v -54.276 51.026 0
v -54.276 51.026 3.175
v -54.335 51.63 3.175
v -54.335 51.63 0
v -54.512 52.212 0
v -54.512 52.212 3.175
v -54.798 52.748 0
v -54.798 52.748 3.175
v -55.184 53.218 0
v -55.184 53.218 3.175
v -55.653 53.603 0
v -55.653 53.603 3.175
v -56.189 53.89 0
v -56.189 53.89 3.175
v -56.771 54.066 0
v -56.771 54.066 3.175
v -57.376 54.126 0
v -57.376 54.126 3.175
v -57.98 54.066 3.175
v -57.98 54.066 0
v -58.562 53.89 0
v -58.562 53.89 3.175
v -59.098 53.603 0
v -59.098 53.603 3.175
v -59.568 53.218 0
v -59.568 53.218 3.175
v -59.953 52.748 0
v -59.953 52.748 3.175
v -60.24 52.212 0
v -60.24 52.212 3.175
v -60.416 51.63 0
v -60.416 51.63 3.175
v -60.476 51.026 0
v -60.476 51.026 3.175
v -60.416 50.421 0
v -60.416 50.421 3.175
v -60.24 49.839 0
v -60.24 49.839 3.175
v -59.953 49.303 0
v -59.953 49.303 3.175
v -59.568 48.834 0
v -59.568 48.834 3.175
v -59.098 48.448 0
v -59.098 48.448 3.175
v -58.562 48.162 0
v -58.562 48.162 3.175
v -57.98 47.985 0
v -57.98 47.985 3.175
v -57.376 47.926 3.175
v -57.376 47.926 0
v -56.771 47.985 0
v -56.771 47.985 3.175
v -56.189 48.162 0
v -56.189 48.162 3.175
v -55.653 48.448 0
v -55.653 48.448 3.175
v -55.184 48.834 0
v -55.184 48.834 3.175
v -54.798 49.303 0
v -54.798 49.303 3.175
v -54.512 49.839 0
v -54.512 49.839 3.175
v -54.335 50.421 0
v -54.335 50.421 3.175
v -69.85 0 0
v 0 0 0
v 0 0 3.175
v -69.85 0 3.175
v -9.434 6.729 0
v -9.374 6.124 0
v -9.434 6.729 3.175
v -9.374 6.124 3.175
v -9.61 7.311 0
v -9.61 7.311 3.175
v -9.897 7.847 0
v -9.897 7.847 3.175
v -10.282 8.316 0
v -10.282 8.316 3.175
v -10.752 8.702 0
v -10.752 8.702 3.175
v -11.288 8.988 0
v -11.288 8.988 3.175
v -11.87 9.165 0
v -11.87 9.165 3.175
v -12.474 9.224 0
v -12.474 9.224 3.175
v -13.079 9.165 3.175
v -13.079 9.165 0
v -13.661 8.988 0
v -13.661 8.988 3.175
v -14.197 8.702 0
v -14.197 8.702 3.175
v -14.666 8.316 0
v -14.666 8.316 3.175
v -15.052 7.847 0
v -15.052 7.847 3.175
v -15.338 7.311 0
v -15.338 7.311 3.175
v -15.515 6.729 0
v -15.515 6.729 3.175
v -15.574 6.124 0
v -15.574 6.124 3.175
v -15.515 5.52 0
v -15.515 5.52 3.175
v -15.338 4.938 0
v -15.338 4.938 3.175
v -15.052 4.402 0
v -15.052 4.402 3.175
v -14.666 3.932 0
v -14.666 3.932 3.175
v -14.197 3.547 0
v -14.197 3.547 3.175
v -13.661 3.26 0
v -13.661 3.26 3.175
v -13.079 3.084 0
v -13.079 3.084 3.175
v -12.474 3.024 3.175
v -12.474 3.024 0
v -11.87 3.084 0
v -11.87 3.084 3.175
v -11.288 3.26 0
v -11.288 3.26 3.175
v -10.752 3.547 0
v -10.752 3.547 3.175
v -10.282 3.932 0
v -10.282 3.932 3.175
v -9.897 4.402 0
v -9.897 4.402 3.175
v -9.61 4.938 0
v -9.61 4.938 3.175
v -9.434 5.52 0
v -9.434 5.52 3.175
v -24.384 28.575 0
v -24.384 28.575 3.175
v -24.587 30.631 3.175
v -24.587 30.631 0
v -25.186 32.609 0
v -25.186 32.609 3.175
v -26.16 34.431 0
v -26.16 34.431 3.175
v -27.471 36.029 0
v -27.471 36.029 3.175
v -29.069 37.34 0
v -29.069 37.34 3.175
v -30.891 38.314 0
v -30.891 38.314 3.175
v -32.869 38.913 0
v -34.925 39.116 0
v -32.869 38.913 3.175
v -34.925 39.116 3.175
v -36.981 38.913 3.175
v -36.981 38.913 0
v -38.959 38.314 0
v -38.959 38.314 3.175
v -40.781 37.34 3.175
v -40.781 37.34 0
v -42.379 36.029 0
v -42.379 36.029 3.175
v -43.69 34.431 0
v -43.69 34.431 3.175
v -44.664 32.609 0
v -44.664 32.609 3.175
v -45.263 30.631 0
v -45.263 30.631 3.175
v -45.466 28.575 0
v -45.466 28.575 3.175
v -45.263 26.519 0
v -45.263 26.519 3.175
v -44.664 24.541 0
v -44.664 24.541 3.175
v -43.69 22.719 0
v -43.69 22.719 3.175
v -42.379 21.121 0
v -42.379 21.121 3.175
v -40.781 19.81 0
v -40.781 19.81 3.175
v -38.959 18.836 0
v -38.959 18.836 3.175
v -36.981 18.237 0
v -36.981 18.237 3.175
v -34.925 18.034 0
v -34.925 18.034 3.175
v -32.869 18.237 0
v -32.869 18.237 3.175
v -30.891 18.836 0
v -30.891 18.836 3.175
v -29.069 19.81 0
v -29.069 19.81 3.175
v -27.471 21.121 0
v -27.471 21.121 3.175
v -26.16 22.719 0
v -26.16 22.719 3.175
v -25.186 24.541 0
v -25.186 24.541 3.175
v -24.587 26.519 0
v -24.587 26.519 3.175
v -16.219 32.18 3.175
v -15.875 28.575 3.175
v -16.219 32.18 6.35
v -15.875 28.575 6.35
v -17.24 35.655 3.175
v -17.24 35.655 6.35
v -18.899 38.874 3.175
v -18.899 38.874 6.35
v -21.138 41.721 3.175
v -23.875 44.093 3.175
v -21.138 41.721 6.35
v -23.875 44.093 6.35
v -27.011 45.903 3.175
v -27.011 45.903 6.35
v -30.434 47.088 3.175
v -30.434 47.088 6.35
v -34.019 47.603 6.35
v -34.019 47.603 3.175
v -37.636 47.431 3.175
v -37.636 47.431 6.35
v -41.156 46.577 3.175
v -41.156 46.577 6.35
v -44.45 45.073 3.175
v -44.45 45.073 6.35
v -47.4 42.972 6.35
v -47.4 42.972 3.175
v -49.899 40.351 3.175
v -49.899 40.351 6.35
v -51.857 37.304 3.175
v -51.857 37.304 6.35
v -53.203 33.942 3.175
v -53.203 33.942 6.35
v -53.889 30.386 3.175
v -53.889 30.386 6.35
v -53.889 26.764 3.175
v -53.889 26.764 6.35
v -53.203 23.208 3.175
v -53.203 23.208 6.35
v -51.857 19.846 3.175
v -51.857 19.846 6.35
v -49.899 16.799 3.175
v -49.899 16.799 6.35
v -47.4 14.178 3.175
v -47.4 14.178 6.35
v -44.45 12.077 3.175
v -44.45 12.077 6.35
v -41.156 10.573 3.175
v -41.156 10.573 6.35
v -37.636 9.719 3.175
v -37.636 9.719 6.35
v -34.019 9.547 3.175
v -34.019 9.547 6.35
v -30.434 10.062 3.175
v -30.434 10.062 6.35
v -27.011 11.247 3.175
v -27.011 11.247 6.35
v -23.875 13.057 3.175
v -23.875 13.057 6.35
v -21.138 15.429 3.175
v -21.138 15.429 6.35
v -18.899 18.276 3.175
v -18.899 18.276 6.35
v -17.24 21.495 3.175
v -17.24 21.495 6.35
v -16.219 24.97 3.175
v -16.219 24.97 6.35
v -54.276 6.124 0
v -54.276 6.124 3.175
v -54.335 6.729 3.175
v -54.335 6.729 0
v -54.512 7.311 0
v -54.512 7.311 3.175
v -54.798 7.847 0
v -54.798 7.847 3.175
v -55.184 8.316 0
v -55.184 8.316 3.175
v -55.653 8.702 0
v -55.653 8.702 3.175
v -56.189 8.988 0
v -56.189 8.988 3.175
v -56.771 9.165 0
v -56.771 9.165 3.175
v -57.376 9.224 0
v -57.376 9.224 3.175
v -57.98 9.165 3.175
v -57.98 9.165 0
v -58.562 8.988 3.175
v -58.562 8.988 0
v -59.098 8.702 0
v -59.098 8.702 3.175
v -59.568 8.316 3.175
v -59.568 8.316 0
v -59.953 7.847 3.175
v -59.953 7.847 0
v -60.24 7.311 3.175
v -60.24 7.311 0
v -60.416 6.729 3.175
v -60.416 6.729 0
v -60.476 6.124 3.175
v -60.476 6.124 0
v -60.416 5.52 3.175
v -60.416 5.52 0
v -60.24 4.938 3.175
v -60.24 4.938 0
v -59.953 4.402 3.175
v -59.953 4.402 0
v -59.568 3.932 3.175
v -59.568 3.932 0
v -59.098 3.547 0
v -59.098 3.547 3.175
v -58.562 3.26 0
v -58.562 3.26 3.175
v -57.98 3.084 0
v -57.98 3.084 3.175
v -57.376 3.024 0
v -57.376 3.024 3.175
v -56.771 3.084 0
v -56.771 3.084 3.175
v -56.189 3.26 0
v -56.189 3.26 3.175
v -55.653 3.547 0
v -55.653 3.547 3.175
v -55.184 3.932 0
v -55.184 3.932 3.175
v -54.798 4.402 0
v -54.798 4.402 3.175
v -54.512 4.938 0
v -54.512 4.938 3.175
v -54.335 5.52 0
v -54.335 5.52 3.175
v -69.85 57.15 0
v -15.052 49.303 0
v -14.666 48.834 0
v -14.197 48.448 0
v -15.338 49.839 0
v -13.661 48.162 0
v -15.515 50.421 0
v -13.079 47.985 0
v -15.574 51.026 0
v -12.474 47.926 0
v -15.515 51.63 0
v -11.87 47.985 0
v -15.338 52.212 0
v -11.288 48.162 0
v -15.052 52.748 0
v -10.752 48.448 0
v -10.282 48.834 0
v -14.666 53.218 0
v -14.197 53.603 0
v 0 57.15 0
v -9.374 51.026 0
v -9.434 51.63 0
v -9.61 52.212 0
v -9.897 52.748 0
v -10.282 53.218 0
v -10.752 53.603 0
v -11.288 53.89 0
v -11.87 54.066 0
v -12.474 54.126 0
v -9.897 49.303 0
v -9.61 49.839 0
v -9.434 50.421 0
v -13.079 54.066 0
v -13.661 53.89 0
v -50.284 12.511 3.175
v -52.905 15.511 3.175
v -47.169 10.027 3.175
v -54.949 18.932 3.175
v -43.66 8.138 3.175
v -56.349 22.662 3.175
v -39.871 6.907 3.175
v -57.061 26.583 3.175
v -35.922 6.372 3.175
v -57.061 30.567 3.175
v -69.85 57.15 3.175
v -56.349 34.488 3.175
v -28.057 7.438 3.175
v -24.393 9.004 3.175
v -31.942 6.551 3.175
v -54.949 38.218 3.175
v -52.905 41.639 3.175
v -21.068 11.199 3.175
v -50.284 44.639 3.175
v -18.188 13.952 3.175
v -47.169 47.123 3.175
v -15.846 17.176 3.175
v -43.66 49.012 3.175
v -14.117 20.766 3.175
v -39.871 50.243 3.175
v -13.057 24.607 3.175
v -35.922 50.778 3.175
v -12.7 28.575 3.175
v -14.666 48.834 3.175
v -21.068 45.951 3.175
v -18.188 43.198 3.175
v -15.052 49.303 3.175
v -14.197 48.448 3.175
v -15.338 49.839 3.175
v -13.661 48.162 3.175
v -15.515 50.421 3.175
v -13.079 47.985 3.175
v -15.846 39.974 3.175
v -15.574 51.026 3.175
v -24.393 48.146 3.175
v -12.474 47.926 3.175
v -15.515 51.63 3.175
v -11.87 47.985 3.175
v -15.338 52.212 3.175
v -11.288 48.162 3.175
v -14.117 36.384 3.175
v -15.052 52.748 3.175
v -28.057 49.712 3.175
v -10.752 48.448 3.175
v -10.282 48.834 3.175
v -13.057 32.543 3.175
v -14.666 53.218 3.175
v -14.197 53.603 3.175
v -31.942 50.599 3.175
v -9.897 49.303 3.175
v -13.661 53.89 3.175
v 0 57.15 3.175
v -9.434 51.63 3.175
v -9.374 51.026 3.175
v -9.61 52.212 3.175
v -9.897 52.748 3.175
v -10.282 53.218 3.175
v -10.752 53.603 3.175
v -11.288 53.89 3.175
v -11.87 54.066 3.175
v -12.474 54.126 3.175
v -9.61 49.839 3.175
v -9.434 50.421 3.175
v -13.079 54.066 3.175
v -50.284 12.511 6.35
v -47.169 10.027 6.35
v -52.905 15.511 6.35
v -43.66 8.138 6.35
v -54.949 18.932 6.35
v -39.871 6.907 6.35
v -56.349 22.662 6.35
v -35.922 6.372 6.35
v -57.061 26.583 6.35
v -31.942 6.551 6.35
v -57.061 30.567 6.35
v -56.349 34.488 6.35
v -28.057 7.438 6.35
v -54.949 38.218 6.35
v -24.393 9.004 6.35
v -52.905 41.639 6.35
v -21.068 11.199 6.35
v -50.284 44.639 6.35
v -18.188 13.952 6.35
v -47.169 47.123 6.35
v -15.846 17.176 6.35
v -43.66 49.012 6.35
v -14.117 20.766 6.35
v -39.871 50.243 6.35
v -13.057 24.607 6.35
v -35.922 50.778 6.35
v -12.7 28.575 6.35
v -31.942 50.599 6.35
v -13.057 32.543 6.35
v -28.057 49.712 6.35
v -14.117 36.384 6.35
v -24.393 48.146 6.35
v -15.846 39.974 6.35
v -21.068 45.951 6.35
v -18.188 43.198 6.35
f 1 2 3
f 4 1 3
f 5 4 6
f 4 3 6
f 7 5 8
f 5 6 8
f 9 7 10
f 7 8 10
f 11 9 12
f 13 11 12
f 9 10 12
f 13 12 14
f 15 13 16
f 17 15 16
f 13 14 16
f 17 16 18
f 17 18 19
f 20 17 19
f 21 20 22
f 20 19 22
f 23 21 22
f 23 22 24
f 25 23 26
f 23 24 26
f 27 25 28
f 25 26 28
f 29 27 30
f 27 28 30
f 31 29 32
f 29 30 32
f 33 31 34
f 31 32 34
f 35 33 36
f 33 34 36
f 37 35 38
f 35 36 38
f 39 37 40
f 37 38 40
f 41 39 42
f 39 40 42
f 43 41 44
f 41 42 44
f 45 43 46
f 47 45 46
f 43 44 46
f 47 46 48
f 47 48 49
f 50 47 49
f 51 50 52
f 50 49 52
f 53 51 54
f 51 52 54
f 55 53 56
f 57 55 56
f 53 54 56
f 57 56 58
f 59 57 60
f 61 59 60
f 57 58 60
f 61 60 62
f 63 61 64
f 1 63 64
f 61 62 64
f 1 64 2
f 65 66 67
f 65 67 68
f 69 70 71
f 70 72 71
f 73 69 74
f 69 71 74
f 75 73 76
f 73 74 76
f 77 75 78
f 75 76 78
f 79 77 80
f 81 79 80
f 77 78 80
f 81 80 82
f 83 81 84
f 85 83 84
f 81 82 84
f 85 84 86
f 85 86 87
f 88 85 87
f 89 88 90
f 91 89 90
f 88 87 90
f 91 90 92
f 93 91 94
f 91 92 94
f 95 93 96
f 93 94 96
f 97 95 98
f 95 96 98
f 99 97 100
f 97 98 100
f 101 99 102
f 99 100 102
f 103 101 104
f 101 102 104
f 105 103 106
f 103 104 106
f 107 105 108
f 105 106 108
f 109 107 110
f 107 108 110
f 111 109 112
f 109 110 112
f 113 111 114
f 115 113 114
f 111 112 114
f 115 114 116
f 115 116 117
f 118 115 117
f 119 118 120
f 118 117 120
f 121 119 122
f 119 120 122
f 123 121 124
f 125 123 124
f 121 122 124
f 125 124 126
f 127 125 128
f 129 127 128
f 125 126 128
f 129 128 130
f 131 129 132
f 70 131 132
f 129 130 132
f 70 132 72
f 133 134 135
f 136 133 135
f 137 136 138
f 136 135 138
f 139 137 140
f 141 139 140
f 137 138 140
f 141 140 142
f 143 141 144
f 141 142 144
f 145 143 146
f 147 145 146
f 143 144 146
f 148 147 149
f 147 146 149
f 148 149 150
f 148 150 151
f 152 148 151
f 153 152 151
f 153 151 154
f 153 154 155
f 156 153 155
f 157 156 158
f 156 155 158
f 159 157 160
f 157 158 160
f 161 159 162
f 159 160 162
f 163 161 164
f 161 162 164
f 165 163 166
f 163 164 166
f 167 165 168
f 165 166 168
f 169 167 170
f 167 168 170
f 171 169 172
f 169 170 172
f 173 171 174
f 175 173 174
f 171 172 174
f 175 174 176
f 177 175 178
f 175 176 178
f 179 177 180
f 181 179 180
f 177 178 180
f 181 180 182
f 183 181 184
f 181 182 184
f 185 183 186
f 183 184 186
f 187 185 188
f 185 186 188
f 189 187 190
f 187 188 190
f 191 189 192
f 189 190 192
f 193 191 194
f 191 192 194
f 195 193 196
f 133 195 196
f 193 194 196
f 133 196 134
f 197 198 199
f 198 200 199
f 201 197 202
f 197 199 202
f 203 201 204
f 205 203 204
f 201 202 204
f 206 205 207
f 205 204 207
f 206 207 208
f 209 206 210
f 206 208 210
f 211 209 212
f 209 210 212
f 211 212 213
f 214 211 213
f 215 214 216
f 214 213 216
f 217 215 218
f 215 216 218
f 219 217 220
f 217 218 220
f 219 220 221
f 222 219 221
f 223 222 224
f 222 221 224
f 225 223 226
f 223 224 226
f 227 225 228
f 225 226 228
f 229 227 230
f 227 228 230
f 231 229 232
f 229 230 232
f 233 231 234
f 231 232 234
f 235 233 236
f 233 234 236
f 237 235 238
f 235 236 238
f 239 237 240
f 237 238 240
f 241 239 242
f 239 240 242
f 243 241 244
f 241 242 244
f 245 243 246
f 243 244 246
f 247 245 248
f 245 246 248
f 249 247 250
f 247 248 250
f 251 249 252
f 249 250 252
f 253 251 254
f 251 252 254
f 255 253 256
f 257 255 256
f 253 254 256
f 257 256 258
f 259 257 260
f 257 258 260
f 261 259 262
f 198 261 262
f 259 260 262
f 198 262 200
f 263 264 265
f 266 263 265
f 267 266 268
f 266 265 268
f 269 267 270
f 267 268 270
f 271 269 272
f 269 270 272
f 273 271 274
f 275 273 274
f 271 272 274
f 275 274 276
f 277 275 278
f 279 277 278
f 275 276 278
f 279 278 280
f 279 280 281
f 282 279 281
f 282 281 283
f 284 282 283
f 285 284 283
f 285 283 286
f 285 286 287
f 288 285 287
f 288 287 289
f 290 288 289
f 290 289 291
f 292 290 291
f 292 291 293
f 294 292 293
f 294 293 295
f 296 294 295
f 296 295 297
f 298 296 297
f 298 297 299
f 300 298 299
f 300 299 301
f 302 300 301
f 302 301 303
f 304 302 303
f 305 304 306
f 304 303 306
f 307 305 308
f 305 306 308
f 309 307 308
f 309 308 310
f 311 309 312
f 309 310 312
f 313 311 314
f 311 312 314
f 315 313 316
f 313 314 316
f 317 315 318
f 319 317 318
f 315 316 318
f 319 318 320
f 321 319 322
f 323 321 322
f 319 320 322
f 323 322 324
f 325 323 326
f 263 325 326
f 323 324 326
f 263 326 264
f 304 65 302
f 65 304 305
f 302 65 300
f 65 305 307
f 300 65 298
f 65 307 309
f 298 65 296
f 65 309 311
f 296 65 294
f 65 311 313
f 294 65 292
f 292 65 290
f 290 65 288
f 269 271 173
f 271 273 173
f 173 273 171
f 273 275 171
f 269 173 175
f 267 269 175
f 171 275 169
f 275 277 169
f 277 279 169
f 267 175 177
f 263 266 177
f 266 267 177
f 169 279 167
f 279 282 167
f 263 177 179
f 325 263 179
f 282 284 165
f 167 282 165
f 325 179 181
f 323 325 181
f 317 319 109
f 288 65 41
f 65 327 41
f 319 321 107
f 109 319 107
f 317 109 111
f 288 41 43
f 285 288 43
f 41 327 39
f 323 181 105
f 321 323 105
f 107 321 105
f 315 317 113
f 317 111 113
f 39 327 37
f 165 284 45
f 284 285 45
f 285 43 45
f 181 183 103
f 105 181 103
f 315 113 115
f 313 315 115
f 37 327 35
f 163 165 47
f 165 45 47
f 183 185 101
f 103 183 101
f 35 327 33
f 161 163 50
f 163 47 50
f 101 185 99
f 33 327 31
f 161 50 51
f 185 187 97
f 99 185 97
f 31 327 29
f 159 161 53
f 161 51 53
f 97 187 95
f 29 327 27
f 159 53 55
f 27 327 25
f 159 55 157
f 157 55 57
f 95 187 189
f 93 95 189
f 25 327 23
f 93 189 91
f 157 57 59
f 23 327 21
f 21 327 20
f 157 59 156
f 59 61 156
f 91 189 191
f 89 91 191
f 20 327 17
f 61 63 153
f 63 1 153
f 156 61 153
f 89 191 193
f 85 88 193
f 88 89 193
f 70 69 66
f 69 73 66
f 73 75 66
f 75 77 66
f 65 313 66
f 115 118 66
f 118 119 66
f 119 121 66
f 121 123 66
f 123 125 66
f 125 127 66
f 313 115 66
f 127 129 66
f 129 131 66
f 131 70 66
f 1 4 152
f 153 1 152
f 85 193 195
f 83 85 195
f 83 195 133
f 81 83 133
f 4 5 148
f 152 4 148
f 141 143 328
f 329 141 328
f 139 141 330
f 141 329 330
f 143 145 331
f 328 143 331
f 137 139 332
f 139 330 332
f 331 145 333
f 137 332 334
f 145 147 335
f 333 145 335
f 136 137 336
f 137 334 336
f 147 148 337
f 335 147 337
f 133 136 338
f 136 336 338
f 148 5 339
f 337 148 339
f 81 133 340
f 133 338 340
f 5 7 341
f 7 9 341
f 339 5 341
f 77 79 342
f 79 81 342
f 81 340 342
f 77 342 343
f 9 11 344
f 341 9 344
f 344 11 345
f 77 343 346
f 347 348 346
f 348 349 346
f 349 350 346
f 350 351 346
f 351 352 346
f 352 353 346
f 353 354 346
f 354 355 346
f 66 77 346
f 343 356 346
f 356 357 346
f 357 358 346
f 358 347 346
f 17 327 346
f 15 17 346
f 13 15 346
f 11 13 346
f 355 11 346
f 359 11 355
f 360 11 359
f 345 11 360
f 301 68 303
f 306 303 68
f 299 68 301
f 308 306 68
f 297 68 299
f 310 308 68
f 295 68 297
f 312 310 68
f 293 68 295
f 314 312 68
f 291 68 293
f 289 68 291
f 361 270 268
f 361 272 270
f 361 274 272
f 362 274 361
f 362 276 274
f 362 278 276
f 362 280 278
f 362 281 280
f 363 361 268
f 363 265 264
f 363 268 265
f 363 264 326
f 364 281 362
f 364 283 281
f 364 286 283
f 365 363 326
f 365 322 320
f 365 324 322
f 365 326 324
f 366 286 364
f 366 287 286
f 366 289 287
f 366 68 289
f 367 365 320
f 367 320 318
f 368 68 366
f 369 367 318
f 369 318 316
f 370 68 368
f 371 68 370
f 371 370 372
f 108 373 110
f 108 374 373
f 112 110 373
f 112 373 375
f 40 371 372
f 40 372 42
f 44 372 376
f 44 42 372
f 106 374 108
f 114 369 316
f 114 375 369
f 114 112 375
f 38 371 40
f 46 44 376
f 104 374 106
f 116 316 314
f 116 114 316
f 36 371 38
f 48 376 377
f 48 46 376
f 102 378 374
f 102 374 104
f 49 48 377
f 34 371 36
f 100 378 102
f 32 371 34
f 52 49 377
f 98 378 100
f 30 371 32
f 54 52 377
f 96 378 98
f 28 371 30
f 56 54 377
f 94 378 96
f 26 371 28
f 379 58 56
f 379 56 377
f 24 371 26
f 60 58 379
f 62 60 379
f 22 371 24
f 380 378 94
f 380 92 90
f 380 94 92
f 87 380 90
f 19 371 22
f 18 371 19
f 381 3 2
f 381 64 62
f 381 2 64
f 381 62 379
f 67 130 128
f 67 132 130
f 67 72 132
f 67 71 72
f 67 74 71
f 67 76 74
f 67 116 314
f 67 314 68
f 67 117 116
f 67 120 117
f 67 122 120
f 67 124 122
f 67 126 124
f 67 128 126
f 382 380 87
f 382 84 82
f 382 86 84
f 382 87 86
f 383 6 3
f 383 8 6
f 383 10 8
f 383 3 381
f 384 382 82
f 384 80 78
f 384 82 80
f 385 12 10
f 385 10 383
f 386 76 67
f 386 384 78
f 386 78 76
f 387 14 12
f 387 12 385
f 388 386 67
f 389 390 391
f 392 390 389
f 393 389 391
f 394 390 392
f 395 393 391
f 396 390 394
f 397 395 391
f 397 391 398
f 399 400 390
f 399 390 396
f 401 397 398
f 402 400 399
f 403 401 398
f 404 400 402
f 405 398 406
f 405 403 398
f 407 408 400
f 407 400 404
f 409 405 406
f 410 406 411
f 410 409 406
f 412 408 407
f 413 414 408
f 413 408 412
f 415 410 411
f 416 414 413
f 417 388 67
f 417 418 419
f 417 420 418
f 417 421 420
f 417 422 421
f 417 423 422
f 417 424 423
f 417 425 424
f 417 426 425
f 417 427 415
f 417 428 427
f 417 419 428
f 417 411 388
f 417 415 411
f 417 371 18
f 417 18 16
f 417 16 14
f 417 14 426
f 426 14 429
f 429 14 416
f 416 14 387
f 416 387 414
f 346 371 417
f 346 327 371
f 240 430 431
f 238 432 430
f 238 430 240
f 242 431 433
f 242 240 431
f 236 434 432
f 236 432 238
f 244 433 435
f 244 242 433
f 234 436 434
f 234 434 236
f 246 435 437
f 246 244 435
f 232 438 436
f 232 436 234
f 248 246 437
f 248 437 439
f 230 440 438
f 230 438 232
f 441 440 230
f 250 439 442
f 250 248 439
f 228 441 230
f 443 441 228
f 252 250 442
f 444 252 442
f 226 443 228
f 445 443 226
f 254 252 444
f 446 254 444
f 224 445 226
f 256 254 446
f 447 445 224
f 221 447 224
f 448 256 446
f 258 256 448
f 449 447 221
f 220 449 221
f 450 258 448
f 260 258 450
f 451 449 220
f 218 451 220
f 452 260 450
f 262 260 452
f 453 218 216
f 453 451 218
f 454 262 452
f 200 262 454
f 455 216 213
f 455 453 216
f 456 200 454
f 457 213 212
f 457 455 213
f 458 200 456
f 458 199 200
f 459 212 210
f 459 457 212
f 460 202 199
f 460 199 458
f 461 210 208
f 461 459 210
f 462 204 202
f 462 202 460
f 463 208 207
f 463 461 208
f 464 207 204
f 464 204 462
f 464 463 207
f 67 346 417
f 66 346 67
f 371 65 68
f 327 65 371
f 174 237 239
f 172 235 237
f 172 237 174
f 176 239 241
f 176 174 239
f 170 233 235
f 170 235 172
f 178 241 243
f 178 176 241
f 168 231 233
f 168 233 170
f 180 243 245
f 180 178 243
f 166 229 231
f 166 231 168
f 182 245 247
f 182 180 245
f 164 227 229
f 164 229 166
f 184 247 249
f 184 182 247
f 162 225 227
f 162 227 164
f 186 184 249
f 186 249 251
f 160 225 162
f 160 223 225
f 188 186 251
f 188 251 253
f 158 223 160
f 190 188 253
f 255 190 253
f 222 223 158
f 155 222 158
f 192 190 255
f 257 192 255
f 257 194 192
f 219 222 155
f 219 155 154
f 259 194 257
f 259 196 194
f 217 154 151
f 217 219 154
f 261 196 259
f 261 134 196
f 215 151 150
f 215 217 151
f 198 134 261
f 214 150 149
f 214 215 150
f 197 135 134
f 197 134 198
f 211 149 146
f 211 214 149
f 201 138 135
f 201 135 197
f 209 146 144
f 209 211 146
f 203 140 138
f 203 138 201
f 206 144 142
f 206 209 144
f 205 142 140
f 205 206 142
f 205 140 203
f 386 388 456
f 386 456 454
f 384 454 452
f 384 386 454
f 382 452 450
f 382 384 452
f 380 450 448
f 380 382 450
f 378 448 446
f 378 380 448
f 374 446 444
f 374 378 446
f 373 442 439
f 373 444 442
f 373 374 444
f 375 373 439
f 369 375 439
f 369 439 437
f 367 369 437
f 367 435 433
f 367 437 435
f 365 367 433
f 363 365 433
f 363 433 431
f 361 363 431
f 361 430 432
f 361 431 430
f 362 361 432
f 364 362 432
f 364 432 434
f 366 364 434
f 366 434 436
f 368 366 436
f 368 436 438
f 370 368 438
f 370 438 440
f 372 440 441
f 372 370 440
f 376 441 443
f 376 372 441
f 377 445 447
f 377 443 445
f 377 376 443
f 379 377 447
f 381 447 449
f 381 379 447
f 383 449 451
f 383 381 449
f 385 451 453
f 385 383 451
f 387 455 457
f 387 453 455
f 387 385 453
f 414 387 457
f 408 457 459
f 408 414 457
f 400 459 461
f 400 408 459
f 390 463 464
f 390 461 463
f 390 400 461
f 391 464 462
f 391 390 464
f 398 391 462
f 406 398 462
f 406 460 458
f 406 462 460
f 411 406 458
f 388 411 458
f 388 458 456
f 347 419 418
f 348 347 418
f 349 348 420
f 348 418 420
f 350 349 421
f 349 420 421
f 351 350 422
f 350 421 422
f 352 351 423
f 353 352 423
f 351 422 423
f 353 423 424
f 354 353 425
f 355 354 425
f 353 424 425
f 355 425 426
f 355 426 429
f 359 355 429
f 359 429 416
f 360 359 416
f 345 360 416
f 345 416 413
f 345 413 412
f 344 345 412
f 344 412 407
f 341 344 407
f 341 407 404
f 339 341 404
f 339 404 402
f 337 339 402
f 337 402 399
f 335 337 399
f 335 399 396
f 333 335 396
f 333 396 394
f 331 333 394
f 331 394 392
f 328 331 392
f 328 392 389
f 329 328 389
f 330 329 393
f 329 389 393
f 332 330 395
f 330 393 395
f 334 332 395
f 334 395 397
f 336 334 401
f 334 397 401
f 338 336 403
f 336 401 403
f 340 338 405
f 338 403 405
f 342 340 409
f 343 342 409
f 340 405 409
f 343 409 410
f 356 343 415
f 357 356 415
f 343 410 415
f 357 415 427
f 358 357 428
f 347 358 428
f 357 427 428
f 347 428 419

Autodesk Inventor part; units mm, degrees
ref_plane "YZ Plane" through (0, 0, 0) normal (1, 0, 0) x (0, 1, 0)
ref_plane "XZ Plane" through (0, 0, 0) normal (0, 1, 0) x (-1, 0, 0)
ref_plane "XY Plane" through (0, 0, 0) normal (0, 0, 1) x (1, 0, 0)
sketch "Sketch1" plane through (0, 0, 0) normal (0, 0, 1) x (1, 0, 0)
  line L0 (0, 0) -> (-69.85, 0)
  line L1 (-69.85, 0) -> (-69.85, 57.15)
  line L2 (-69.85, 57.15) -> (0, 57.15)
  line L3 (0, 57.15) -> (0, 0)
  dimension "d0" = 69.85
  dimension "d1" = 57.15
extrude "Extrusion1" add sketch "Sketch1" along normal blind 3.175
sketch "Sketch2" plane through (0, 0, 3.175) normal (0, 0, 1) x (1, 0, 0)
  line L0 (-69.85, 57.15) -> (-69.85, 0) construction
  line L1 (-69.85, 0) -> (0, 0) construction
  line L2 (-69.85, 57.15) -> (0, 0) construction
  circle A0 centre (-34.925, 28.575) radius 22.225
  dimension "d4" = 44.45
extrude "Extrusion2" add sketch "Sketch2" along normal blind 3.175
sketch "Sketch3" plane through (0, 0, 3.175) normal (0, 0, 1) x (1, 0, 0)
  circle A0 centre (-34.925, 28.575) radius 22.225 construction
  circle A1 centre (-34.925, 28.575) radius 31.75 construction
  line L0 (-34.925, 28.575) -> (-12.4744, 6.1244) construction
  line L1 (-34.925, 28.575) -> (-3.175, 28.575) construction
  circle A2 centre (-12.4744, 6.1244) radius 3.1
  circle A3 centre (-12.4744, 51.0256) radius 3.1
  circle A4 centre (-57.3756, 51.0256) radius 3.1
  circle A5 centre (-57.3756, 6.1244) radius 3.1
  point P0 (0, 0)
  dimension "d7" = 63.5
  dimension "d8" = 45
  dimension "d9" = 6.2
  dimension "d12" = 360
extrude "Extrusion3" cut sketch "Sketch3" against normal blind 3.175
sketch "Sketch4" plane through (-34.925, 28.575, 6.35) normal (0, 0, 1) x (1, 0, 0)
  circle A0 centre (0, 0) radius 19.05
  point P0 (34.925, -28.575)
  dimension "d16" = 38.1
extrude "Extrusion4" cut sketch "Sketch4" against normal blind 3.175
sketch "Sketch5" plane through (-34.925, 28.575, 3.175) normal (0, 0, 1) x (1, 0, 0)
  circle A0 centre (0, 0) radius 10.541
  point P0 (34.925, -28.575)
  dimension "d19" = 21.082
extrude "Extrusion5" cut sketch "Sketch5" against normal blind 3.175
properties part number "endcap2" material "Aluminum 6061"
